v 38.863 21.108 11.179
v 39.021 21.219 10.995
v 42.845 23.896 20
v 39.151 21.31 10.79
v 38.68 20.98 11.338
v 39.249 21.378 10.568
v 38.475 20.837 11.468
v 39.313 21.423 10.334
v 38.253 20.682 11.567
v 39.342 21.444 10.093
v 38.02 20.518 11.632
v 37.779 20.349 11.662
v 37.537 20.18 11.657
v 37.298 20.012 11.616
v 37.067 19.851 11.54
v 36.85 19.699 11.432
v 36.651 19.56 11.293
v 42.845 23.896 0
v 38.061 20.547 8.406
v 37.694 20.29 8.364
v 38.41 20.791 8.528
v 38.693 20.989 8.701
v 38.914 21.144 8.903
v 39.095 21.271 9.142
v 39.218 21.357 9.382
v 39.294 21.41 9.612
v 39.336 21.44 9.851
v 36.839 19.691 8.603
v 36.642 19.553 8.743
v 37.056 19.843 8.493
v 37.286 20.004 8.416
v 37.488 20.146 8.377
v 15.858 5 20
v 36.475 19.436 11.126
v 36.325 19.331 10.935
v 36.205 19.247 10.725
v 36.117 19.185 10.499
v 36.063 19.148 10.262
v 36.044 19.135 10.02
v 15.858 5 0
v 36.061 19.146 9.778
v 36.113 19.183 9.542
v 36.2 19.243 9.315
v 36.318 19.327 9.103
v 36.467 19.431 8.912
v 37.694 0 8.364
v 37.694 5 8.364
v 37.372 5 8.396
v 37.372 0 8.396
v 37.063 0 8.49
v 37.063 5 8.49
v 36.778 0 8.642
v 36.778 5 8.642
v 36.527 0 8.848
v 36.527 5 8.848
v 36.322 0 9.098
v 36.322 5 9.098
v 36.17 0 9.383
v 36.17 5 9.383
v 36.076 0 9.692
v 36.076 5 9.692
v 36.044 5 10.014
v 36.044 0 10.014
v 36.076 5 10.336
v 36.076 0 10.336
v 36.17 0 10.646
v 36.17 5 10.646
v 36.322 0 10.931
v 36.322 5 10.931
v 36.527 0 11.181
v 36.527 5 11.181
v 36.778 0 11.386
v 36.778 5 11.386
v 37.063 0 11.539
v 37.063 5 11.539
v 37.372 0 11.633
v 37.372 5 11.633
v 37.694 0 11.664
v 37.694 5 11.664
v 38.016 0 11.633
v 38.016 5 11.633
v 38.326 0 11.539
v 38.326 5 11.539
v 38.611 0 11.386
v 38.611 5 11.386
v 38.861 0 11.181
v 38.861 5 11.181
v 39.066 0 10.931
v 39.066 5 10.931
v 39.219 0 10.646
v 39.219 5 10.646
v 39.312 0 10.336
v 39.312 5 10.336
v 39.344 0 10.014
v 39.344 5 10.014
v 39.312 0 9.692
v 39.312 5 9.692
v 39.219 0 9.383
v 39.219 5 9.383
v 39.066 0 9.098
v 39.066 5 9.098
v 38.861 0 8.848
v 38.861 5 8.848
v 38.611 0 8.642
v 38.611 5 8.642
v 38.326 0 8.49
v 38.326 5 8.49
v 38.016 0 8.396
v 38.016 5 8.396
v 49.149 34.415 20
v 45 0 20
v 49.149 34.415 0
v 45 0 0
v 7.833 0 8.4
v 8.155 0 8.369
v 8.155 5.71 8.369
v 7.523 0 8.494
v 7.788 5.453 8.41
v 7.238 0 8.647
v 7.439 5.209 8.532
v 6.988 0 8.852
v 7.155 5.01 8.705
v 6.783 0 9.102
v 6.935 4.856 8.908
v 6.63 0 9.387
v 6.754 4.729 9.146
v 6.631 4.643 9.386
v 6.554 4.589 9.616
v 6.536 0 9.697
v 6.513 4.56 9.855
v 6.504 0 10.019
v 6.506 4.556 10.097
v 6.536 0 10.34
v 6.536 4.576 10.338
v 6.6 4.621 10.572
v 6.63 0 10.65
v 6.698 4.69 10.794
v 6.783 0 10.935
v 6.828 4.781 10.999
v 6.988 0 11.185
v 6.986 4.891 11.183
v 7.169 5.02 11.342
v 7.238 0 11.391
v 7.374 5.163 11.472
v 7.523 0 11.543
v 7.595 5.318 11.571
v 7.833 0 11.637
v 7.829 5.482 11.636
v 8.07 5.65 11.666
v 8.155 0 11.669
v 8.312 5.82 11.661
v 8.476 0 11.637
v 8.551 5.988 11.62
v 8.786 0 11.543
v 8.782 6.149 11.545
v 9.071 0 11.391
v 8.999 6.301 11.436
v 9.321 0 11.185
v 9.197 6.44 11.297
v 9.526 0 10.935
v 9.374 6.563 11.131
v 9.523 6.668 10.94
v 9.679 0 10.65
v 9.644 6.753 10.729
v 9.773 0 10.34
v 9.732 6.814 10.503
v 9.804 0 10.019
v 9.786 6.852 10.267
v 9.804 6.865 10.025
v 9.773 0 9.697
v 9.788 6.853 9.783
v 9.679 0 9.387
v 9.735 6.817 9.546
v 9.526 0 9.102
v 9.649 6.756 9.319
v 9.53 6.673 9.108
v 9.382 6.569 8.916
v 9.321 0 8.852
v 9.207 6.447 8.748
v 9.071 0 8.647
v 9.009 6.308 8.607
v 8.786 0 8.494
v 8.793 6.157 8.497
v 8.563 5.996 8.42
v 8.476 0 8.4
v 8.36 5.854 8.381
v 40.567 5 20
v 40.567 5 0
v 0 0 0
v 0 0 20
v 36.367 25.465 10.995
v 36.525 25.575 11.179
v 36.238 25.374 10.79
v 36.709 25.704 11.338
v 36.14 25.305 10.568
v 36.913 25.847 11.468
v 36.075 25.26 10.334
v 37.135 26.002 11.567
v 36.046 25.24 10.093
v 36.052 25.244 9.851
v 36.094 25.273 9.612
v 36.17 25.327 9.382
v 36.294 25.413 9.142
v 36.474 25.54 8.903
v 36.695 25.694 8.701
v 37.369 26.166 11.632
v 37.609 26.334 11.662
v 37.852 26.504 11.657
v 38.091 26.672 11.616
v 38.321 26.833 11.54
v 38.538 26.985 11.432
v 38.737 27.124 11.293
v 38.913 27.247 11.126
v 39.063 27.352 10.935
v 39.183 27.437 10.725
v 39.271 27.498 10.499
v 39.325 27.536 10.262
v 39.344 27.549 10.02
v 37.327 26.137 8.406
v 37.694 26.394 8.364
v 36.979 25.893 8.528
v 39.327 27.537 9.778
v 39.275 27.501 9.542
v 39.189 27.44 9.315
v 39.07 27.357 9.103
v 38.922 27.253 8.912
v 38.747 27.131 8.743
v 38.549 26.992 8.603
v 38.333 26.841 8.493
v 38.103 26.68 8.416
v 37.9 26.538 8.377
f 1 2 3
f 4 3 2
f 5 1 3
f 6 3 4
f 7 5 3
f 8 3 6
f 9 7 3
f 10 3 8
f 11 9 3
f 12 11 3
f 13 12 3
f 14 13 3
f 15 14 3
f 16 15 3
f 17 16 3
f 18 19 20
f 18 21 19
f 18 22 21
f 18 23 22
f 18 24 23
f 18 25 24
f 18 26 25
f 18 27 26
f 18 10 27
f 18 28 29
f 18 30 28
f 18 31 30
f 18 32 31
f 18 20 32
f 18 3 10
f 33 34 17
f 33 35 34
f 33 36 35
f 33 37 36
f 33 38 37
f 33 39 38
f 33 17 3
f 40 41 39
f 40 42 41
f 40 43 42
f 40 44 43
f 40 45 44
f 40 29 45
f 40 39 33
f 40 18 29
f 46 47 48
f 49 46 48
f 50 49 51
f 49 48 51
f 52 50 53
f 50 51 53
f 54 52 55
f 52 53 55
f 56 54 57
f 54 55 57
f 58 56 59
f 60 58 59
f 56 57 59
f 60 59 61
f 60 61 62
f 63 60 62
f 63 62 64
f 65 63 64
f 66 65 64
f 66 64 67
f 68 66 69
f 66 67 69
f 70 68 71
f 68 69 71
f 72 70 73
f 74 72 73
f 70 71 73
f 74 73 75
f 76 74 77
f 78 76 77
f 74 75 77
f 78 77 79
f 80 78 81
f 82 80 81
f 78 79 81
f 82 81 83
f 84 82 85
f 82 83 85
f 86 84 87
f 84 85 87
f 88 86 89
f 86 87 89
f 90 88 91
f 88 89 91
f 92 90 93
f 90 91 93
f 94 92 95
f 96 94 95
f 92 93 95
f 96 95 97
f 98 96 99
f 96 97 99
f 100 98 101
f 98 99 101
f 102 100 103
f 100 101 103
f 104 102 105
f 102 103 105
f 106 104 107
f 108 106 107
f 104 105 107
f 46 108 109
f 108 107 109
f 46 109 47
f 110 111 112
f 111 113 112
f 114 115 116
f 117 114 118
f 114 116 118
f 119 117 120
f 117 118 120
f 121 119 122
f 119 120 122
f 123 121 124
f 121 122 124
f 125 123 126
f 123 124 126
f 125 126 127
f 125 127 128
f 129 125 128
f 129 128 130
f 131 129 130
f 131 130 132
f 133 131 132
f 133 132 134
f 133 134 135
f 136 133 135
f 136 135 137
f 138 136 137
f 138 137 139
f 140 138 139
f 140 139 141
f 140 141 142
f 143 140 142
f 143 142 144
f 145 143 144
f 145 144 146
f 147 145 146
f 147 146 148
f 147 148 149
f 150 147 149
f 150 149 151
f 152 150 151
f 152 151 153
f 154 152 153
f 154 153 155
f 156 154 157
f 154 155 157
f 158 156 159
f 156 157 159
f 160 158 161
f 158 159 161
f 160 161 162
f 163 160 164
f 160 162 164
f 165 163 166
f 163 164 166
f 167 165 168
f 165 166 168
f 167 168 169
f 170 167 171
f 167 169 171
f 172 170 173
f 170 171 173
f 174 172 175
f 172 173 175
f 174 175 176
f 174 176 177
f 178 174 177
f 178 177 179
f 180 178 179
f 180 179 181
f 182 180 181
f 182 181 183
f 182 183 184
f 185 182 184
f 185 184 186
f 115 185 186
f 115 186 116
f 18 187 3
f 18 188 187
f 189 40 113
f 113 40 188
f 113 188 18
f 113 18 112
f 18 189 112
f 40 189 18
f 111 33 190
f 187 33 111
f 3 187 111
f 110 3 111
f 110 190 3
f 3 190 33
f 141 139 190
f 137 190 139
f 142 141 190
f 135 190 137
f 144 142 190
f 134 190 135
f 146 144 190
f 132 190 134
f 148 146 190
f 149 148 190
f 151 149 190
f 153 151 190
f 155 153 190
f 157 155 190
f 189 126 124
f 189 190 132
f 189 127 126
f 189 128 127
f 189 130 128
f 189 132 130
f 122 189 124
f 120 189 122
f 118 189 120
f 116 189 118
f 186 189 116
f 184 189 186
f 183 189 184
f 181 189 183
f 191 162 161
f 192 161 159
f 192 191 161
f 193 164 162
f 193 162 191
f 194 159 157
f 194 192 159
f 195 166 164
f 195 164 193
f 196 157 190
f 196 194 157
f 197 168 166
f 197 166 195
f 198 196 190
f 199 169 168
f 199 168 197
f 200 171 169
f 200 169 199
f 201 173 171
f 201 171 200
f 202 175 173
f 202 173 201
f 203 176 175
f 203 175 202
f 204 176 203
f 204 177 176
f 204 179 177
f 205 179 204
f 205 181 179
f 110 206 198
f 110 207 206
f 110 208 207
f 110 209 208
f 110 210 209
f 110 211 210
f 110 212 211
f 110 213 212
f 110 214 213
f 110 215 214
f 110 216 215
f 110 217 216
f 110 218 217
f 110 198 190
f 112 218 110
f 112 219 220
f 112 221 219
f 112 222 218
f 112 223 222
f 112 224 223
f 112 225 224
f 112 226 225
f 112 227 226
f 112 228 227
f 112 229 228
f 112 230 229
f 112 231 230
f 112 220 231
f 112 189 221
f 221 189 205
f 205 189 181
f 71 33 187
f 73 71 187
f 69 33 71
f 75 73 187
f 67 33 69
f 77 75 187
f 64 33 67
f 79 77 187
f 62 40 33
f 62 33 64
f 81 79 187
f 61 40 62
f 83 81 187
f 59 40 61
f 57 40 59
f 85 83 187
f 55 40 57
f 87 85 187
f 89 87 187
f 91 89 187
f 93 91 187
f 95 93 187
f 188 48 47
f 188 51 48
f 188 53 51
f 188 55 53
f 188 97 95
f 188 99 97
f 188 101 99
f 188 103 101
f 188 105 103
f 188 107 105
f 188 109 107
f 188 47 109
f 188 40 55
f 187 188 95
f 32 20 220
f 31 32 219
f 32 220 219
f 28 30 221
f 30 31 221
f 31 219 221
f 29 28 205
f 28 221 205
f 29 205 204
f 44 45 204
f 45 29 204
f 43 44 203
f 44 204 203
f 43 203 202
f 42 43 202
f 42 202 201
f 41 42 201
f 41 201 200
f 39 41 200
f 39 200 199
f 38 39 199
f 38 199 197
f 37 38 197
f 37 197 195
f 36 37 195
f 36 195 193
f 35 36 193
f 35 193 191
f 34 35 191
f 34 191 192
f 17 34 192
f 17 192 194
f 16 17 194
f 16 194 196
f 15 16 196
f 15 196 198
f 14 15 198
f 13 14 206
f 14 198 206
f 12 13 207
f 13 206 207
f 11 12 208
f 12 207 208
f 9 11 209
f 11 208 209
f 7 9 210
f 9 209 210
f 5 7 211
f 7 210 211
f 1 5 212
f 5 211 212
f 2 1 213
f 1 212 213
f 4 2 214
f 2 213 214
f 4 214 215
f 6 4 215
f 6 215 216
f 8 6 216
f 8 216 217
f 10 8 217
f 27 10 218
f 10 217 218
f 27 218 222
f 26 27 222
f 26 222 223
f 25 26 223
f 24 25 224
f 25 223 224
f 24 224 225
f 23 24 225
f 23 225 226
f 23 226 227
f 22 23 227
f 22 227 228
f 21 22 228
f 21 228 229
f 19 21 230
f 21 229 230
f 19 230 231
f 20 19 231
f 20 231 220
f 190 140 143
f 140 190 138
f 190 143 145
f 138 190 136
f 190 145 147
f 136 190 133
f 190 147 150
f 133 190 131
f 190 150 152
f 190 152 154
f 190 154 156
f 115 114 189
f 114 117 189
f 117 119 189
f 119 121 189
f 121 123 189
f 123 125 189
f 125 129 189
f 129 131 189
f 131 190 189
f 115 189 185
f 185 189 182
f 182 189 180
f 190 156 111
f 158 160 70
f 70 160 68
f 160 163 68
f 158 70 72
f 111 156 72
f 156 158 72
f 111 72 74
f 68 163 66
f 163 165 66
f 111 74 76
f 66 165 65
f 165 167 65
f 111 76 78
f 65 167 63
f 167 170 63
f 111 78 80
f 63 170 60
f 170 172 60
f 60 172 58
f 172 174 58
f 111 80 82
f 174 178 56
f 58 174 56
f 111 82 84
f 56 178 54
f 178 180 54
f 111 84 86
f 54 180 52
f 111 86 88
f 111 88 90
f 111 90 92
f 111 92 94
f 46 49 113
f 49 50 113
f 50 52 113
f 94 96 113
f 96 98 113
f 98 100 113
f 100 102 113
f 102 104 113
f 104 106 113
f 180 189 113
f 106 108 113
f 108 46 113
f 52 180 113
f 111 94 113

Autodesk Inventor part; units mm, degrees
ref_plane "YZ Plane" through (0, 0, 0) normal (1, 0, 0) x (0, 1, 0)
ref_plane "XZ Plane" through (0, 0, 0) normal (0, 1, 0) x (-1, 0, 0)
ref_plane "XY Plane" through (0, 0, 0) normal (0, 0, 1) x (1, 0, 0)
sketch "Sketch1" plane through (0, 0, 0) normal (0, 0, 1) x (1, 0, 0)
  line L0 (0, 0) -> (49.1491, 34.4146)
  line L1 (0, 0) -> (60, 0) construction
  line L2 (0, 0) -> (45, 0)
  line L3 (45, 0) -> (49.1491, 34.4146)
  line L4 (42.8448, 23.8964) -> (15.858, 5)
  line L5 (15.858, 5) -> (40.5666, 5)
  line L6 (40.5666, 5) -> (42.8448, 23.8964)
  dimension "d0" = 60
  dimension "d1" = 35
  dimension "d2" = 45
  dimension "d3" = 5
extrude "Extrusion1" add sketch "Sketch1" along normal blind 20
ref_plane "Work Plane1" through (0, 0, 10) normal (0, 0, 1) x (1, 0, 0)
sketch "Sketch2" plane through (0, 0, 0) normal (0, -1, 0) x (1, 0, 0)
  point P0 (0, 0)
  point P1 (37.6942, 10.0143)
  point P2 (8.1545, 10.0186)
hole "Hole1" at (37.6942, 0, 10.0143) at (8.1545, 0, 10.0186) direction (0, 1, 0) diameter 3.3 end through all
properties part number "BatteryHolder"
